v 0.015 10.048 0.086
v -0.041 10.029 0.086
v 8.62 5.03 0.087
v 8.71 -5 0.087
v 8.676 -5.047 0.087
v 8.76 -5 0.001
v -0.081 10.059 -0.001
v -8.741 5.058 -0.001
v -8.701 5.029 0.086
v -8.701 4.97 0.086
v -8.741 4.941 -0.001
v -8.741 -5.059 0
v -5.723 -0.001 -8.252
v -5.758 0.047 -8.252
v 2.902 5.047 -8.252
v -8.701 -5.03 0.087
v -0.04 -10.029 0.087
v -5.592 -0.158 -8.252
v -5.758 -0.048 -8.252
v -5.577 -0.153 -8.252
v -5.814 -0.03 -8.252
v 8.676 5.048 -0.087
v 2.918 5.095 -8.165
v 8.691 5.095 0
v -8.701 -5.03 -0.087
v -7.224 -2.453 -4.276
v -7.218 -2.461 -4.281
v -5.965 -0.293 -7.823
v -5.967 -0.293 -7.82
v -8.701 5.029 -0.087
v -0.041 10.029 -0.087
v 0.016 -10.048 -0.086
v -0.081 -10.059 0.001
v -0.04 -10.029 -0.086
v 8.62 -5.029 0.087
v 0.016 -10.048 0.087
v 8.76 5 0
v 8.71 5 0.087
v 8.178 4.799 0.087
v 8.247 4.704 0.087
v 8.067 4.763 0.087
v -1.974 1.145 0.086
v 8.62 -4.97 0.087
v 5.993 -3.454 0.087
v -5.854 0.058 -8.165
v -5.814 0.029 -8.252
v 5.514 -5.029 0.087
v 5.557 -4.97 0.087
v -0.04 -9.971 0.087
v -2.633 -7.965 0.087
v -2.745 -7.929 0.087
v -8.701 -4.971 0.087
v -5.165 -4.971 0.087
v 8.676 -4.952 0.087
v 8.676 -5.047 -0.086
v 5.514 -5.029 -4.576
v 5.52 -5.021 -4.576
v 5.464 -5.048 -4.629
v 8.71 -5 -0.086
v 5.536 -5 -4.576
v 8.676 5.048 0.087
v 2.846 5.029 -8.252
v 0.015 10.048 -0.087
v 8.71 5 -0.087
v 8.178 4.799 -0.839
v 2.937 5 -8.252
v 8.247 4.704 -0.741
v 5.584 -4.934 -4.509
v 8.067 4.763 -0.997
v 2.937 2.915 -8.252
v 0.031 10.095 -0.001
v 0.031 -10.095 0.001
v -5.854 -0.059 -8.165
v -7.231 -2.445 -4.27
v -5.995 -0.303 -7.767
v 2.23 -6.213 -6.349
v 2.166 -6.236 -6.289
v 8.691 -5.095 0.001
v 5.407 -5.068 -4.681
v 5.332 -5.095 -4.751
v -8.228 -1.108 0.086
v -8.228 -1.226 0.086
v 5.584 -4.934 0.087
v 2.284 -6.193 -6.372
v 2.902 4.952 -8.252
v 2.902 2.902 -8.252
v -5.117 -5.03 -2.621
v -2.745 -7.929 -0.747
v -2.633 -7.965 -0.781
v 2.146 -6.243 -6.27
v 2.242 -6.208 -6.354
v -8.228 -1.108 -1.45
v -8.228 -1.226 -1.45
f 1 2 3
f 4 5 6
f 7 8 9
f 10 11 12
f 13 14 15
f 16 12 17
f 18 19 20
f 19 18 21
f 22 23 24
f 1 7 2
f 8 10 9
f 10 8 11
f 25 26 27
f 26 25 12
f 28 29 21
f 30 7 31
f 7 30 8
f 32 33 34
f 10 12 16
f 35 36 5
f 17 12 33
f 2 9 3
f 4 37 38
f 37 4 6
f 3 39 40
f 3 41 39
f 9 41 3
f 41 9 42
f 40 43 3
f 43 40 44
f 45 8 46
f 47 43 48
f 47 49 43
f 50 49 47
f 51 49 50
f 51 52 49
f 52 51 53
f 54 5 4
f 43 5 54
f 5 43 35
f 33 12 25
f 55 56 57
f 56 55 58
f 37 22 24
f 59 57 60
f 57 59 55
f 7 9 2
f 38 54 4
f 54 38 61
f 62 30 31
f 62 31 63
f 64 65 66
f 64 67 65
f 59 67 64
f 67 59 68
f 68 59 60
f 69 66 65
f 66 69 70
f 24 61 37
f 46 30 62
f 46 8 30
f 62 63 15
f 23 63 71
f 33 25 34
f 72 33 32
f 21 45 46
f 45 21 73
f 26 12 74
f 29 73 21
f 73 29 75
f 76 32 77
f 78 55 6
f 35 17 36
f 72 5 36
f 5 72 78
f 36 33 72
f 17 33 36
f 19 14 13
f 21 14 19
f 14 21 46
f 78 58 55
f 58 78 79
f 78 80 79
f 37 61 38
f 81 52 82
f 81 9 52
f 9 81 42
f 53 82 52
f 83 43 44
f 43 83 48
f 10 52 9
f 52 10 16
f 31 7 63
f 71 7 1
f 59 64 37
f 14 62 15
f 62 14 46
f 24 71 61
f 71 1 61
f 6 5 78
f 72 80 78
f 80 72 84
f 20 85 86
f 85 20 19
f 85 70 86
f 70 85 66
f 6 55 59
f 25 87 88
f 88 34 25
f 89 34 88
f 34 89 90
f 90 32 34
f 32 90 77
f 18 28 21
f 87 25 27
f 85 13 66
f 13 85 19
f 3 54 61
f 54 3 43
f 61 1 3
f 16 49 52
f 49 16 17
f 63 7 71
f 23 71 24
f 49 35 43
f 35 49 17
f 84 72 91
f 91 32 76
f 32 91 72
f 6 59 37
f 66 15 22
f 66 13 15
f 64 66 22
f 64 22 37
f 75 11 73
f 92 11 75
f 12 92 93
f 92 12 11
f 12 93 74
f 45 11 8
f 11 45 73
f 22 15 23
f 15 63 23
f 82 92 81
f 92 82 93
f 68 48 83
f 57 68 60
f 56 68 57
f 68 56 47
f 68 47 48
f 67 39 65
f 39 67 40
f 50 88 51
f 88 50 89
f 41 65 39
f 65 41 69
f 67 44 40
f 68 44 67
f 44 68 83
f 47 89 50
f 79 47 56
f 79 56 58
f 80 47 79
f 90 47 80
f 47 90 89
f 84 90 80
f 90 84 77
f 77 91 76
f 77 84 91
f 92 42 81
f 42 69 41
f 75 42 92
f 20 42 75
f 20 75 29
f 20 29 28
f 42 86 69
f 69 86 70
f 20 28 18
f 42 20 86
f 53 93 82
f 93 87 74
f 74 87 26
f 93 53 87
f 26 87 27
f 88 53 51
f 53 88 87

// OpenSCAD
// Auto-generated OpenSCAD file

    inner_points = 10*[[0.5483513328711939, -0.49343059621073404, 0.5000000000001427], [-0.8147584849794822, -0.1166924584026583, 0.5000000000000114], [0.8147454248469246, 0.4704335994932656, -0.5000000000000114], [-0.2664006220419612, -0.7869936251588691, 1.539879335155092e-13], [-6.530066327234646e-06, 0.17687057054547678, 1.0], [-6.5300662304823955e-06, 0.1768705705451305, -1.0], [0.5483513328712422, -0.4934305962109071, -0.4999999999998575], [-0.8147584849794339, -0.11669245840283138, -0.4999999999999886], [0.8147454248468763, 0.47043359949343866, 0.4999999999999886]];

    outer_points = 10*[[0.2886841223116632, 0.4999680237807507, -0.8165129838048599], [0.8660438627157157, -0.4999680237807507, 5.5219683157359256e-05], [-0.8660438627157157, 0.4999680237807507, -5.5219683157359256e-05], [0.2887210423333781, -0.5000319741744229, -0.8164607672859469], [0.8660069426940007, 0.5000319741744229, 3.0031642442862605e-06], [-0.8660069426940007, -0.5000319741744229, -3.0031642442862605e-06], [-0.5773228203823376, -6.395039367218525e-05, -0.8165159869691043], [3.692002171488182e-05, -0.9999999979551737, 5.221651891308081e-05], [-3.692002171488182e-05, 0.9999999979551737, -5.221651891308081e-05]];

    // Convex hull for inner set (I)
    module inner_hull() {
        hull() {
            for (p = inner_points) {
                translate(p) sphere(r=0.1);
            }
        }
    }

    // Convex hull for outer set (O) minus inner hull (O \ I)
    module outer_minus_inner() {
        difference() {
            hull() {
                for (p = outer_points) {
                    translate(p) sphere(r=0.1);
                }
            }
            inner_hull(); // Subtract inner hull
        }
    }

    // Convex hull for outer set (O) minus all translated inner hulls
    module outer_minus_AllTranslationInner() {
        difference() {
            hull() {
                for (p = outer_points) {
                    translate(p) sphere(r=0.1);
                }
            }
            hull() {
                translate([0,0,50]) inner_hull();
                translate([0,0,-50]) inner_hull();
            }; // Subtract translated inner hulls
        }
    }

    // Difference between outer_minus_inner and outer_minus_AllTranslationInner
    module outer_minus_inner_diff() {
        difference() {
            // Outer minus inner
            difference() {
                hull() {
                    for (p = outer_points) {
                        translate(p) sphere(r=0.1);
                    }
                }
                inner_hull();
            }

            // Subtract Outer minus AllTranslationInner
            difference() {
                hull() {
                    for (p = outer_points) {
                        translate(p) sphere(r=0.1);
                    }
                }
                hull() {
                    translate([0,0,50]) inner_hull();
                    translate([0,0,-50]) inner_hull();
                };
            }
        }
    }

    // Rendering all with colors applied
    color([0, 1, 0, 1]) outer_minus_AllTranslationInner(); // Opaque green
    
